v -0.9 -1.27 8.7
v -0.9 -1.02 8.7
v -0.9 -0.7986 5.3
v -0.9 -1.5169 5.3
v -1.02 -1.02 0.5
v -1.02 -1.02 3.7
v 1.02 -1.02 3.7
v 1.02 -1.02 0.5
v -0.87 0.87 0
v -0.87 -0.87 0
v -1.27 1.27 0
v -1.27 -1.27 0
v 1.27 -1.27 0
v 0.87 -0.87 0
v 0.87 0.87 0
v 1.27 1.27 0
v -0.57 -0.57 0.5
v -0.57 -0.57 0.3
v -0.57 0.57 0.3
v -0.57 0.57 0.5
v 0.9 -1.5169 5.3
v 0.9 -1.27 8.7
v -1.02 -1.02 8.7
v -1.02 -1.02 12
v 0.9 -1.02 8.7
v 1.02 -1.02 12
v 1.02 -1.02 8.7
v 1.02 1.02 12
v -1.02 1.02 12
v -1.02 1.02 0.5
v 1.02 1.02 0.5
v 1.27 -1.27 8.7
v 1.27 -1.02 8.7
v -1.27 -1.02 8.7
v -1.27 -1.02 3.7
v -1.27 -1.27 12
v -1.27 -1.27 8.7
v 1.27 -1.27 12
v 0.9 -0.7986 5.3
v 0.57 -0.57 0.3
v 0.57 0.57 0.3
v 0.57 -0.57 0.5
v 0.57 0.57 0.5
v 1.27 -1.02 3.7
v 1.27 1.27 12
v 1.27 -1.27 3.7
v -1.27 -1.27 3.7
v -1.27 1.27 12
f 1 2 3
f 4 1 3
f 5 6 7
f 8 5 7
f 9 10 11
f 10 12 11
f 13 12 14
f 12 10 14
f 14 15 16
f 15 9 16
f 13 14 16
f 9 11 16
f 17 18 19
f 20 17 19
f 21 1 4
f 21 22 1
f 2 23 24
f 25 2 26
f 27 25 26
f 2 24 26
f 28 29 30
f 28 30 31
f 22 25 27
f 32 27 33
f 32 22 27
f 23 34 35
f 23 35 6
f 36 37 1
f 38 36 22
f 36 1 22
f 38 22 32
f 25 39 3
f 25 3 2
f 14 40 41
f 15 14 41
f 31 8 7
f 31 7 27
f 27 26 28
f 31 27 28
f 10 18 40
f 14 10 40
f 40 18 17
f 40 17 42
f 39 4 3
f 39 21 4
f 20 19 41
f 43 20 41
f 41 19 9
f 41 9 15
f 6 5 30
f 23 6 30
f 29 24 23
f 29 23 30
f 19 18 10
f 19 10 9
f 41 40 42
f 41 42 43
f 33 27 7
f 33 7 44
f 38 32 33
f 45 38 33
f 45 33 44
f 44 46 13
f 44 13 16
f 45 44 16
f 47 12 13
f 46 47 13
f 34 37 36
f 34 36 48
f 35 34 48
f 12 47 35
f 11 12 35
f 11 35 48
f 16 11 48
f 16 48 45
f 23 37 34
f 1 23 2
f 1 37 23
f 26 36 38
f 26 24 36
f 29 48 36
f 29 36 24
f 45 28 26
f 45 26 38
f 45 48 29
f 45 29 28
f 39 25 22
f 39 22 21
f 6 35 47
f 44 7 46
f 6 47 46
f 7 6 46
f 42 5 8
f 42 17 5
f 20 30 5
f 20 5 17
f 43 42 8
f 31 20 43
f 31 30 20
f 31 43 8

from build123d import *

# Parameters (mm, degrees)
SKETCH1_W           = 2.54
SKETCH1_H           = 2.54
SKETCH1_W_2         = 1.14
SKETCH1_H_2         = 1.14
BOSS_EXTRUDE1_DEPTH = 12
SKETCH2_W           = 2.04
SKETCH2_H           = 2.04
CUT_EXTRUDE1_DEPTH  = 11.5
CHAMFER1_SIZE       = 0.3
SKETCH3_W           = 2.54
SKETCH3_H           = 5
CUT_EXTRUDE2_DEPTH  = 0.25
BOSS_EXTRUDE2_DEPTH = 0.9


with BuildPart() as part:
    # Sketch1 → Boss-Extrude1 (new body)
    with BuildSketch(Plane.XY):
        Rectangle(SKETCH1_W, SKETCH1_H)
        Rectangle(SKETCH1_W_2, SKETCH1_H_2, mode=Mode.SUBTRACT)
    extrude(amount=BOSS_EXTRUDE1_DEPTH)

    # Sketch2 → Cut-Extrude1 (cut)
    with BuildSketch(Plane.XY.offset(12)):
        Rectangle(SKETCH2_W, SKETCH2_H)
    extrude(amount=-CUT_EXTRUDE1_DEPTH, mode=Mode.SUBTRACT)

    # Chamfer1
    chamfer1_edges = [part.edges().sort_by_distance(p)[0] for p in [
        (0.57, 0, 0),
        (0, 0.57, 0),
        (-0.57, 0, 0),
        (0, -0.57, 0),
    ]]
    chamfer(chamfer1_edges, length=CHAMFER1_SIZE)

    # Sketch3 → Cut-Extrude2 (cut)
    with BuildSketch(Plane.XZ.offset(1.27)):
        with Locations((0, 6.2)):
            Rectangle(SKETCH3_W, SKETCH3_H)
    extrude(amount=-CUT_EXTRUDE2_DEPTH, mode=Mode.SUBTRACT)

    # Sketch4 → Boss-Extrude2 (add, symmetric)
    with BuildSketch(Plane(origin=(0, 0, 0), x_dir=(0, 0, -1), z_dir=(1, 0, 0))):
        Polygon((-5.3, -1.51689304), (-5.3, -0.798560217), (-8.7, -1.02), (-8.7, -1.27), align=None)
    extrude(amount=BOSS_EXTRUDE2_DEPTH, both=True)


solid = part.part
